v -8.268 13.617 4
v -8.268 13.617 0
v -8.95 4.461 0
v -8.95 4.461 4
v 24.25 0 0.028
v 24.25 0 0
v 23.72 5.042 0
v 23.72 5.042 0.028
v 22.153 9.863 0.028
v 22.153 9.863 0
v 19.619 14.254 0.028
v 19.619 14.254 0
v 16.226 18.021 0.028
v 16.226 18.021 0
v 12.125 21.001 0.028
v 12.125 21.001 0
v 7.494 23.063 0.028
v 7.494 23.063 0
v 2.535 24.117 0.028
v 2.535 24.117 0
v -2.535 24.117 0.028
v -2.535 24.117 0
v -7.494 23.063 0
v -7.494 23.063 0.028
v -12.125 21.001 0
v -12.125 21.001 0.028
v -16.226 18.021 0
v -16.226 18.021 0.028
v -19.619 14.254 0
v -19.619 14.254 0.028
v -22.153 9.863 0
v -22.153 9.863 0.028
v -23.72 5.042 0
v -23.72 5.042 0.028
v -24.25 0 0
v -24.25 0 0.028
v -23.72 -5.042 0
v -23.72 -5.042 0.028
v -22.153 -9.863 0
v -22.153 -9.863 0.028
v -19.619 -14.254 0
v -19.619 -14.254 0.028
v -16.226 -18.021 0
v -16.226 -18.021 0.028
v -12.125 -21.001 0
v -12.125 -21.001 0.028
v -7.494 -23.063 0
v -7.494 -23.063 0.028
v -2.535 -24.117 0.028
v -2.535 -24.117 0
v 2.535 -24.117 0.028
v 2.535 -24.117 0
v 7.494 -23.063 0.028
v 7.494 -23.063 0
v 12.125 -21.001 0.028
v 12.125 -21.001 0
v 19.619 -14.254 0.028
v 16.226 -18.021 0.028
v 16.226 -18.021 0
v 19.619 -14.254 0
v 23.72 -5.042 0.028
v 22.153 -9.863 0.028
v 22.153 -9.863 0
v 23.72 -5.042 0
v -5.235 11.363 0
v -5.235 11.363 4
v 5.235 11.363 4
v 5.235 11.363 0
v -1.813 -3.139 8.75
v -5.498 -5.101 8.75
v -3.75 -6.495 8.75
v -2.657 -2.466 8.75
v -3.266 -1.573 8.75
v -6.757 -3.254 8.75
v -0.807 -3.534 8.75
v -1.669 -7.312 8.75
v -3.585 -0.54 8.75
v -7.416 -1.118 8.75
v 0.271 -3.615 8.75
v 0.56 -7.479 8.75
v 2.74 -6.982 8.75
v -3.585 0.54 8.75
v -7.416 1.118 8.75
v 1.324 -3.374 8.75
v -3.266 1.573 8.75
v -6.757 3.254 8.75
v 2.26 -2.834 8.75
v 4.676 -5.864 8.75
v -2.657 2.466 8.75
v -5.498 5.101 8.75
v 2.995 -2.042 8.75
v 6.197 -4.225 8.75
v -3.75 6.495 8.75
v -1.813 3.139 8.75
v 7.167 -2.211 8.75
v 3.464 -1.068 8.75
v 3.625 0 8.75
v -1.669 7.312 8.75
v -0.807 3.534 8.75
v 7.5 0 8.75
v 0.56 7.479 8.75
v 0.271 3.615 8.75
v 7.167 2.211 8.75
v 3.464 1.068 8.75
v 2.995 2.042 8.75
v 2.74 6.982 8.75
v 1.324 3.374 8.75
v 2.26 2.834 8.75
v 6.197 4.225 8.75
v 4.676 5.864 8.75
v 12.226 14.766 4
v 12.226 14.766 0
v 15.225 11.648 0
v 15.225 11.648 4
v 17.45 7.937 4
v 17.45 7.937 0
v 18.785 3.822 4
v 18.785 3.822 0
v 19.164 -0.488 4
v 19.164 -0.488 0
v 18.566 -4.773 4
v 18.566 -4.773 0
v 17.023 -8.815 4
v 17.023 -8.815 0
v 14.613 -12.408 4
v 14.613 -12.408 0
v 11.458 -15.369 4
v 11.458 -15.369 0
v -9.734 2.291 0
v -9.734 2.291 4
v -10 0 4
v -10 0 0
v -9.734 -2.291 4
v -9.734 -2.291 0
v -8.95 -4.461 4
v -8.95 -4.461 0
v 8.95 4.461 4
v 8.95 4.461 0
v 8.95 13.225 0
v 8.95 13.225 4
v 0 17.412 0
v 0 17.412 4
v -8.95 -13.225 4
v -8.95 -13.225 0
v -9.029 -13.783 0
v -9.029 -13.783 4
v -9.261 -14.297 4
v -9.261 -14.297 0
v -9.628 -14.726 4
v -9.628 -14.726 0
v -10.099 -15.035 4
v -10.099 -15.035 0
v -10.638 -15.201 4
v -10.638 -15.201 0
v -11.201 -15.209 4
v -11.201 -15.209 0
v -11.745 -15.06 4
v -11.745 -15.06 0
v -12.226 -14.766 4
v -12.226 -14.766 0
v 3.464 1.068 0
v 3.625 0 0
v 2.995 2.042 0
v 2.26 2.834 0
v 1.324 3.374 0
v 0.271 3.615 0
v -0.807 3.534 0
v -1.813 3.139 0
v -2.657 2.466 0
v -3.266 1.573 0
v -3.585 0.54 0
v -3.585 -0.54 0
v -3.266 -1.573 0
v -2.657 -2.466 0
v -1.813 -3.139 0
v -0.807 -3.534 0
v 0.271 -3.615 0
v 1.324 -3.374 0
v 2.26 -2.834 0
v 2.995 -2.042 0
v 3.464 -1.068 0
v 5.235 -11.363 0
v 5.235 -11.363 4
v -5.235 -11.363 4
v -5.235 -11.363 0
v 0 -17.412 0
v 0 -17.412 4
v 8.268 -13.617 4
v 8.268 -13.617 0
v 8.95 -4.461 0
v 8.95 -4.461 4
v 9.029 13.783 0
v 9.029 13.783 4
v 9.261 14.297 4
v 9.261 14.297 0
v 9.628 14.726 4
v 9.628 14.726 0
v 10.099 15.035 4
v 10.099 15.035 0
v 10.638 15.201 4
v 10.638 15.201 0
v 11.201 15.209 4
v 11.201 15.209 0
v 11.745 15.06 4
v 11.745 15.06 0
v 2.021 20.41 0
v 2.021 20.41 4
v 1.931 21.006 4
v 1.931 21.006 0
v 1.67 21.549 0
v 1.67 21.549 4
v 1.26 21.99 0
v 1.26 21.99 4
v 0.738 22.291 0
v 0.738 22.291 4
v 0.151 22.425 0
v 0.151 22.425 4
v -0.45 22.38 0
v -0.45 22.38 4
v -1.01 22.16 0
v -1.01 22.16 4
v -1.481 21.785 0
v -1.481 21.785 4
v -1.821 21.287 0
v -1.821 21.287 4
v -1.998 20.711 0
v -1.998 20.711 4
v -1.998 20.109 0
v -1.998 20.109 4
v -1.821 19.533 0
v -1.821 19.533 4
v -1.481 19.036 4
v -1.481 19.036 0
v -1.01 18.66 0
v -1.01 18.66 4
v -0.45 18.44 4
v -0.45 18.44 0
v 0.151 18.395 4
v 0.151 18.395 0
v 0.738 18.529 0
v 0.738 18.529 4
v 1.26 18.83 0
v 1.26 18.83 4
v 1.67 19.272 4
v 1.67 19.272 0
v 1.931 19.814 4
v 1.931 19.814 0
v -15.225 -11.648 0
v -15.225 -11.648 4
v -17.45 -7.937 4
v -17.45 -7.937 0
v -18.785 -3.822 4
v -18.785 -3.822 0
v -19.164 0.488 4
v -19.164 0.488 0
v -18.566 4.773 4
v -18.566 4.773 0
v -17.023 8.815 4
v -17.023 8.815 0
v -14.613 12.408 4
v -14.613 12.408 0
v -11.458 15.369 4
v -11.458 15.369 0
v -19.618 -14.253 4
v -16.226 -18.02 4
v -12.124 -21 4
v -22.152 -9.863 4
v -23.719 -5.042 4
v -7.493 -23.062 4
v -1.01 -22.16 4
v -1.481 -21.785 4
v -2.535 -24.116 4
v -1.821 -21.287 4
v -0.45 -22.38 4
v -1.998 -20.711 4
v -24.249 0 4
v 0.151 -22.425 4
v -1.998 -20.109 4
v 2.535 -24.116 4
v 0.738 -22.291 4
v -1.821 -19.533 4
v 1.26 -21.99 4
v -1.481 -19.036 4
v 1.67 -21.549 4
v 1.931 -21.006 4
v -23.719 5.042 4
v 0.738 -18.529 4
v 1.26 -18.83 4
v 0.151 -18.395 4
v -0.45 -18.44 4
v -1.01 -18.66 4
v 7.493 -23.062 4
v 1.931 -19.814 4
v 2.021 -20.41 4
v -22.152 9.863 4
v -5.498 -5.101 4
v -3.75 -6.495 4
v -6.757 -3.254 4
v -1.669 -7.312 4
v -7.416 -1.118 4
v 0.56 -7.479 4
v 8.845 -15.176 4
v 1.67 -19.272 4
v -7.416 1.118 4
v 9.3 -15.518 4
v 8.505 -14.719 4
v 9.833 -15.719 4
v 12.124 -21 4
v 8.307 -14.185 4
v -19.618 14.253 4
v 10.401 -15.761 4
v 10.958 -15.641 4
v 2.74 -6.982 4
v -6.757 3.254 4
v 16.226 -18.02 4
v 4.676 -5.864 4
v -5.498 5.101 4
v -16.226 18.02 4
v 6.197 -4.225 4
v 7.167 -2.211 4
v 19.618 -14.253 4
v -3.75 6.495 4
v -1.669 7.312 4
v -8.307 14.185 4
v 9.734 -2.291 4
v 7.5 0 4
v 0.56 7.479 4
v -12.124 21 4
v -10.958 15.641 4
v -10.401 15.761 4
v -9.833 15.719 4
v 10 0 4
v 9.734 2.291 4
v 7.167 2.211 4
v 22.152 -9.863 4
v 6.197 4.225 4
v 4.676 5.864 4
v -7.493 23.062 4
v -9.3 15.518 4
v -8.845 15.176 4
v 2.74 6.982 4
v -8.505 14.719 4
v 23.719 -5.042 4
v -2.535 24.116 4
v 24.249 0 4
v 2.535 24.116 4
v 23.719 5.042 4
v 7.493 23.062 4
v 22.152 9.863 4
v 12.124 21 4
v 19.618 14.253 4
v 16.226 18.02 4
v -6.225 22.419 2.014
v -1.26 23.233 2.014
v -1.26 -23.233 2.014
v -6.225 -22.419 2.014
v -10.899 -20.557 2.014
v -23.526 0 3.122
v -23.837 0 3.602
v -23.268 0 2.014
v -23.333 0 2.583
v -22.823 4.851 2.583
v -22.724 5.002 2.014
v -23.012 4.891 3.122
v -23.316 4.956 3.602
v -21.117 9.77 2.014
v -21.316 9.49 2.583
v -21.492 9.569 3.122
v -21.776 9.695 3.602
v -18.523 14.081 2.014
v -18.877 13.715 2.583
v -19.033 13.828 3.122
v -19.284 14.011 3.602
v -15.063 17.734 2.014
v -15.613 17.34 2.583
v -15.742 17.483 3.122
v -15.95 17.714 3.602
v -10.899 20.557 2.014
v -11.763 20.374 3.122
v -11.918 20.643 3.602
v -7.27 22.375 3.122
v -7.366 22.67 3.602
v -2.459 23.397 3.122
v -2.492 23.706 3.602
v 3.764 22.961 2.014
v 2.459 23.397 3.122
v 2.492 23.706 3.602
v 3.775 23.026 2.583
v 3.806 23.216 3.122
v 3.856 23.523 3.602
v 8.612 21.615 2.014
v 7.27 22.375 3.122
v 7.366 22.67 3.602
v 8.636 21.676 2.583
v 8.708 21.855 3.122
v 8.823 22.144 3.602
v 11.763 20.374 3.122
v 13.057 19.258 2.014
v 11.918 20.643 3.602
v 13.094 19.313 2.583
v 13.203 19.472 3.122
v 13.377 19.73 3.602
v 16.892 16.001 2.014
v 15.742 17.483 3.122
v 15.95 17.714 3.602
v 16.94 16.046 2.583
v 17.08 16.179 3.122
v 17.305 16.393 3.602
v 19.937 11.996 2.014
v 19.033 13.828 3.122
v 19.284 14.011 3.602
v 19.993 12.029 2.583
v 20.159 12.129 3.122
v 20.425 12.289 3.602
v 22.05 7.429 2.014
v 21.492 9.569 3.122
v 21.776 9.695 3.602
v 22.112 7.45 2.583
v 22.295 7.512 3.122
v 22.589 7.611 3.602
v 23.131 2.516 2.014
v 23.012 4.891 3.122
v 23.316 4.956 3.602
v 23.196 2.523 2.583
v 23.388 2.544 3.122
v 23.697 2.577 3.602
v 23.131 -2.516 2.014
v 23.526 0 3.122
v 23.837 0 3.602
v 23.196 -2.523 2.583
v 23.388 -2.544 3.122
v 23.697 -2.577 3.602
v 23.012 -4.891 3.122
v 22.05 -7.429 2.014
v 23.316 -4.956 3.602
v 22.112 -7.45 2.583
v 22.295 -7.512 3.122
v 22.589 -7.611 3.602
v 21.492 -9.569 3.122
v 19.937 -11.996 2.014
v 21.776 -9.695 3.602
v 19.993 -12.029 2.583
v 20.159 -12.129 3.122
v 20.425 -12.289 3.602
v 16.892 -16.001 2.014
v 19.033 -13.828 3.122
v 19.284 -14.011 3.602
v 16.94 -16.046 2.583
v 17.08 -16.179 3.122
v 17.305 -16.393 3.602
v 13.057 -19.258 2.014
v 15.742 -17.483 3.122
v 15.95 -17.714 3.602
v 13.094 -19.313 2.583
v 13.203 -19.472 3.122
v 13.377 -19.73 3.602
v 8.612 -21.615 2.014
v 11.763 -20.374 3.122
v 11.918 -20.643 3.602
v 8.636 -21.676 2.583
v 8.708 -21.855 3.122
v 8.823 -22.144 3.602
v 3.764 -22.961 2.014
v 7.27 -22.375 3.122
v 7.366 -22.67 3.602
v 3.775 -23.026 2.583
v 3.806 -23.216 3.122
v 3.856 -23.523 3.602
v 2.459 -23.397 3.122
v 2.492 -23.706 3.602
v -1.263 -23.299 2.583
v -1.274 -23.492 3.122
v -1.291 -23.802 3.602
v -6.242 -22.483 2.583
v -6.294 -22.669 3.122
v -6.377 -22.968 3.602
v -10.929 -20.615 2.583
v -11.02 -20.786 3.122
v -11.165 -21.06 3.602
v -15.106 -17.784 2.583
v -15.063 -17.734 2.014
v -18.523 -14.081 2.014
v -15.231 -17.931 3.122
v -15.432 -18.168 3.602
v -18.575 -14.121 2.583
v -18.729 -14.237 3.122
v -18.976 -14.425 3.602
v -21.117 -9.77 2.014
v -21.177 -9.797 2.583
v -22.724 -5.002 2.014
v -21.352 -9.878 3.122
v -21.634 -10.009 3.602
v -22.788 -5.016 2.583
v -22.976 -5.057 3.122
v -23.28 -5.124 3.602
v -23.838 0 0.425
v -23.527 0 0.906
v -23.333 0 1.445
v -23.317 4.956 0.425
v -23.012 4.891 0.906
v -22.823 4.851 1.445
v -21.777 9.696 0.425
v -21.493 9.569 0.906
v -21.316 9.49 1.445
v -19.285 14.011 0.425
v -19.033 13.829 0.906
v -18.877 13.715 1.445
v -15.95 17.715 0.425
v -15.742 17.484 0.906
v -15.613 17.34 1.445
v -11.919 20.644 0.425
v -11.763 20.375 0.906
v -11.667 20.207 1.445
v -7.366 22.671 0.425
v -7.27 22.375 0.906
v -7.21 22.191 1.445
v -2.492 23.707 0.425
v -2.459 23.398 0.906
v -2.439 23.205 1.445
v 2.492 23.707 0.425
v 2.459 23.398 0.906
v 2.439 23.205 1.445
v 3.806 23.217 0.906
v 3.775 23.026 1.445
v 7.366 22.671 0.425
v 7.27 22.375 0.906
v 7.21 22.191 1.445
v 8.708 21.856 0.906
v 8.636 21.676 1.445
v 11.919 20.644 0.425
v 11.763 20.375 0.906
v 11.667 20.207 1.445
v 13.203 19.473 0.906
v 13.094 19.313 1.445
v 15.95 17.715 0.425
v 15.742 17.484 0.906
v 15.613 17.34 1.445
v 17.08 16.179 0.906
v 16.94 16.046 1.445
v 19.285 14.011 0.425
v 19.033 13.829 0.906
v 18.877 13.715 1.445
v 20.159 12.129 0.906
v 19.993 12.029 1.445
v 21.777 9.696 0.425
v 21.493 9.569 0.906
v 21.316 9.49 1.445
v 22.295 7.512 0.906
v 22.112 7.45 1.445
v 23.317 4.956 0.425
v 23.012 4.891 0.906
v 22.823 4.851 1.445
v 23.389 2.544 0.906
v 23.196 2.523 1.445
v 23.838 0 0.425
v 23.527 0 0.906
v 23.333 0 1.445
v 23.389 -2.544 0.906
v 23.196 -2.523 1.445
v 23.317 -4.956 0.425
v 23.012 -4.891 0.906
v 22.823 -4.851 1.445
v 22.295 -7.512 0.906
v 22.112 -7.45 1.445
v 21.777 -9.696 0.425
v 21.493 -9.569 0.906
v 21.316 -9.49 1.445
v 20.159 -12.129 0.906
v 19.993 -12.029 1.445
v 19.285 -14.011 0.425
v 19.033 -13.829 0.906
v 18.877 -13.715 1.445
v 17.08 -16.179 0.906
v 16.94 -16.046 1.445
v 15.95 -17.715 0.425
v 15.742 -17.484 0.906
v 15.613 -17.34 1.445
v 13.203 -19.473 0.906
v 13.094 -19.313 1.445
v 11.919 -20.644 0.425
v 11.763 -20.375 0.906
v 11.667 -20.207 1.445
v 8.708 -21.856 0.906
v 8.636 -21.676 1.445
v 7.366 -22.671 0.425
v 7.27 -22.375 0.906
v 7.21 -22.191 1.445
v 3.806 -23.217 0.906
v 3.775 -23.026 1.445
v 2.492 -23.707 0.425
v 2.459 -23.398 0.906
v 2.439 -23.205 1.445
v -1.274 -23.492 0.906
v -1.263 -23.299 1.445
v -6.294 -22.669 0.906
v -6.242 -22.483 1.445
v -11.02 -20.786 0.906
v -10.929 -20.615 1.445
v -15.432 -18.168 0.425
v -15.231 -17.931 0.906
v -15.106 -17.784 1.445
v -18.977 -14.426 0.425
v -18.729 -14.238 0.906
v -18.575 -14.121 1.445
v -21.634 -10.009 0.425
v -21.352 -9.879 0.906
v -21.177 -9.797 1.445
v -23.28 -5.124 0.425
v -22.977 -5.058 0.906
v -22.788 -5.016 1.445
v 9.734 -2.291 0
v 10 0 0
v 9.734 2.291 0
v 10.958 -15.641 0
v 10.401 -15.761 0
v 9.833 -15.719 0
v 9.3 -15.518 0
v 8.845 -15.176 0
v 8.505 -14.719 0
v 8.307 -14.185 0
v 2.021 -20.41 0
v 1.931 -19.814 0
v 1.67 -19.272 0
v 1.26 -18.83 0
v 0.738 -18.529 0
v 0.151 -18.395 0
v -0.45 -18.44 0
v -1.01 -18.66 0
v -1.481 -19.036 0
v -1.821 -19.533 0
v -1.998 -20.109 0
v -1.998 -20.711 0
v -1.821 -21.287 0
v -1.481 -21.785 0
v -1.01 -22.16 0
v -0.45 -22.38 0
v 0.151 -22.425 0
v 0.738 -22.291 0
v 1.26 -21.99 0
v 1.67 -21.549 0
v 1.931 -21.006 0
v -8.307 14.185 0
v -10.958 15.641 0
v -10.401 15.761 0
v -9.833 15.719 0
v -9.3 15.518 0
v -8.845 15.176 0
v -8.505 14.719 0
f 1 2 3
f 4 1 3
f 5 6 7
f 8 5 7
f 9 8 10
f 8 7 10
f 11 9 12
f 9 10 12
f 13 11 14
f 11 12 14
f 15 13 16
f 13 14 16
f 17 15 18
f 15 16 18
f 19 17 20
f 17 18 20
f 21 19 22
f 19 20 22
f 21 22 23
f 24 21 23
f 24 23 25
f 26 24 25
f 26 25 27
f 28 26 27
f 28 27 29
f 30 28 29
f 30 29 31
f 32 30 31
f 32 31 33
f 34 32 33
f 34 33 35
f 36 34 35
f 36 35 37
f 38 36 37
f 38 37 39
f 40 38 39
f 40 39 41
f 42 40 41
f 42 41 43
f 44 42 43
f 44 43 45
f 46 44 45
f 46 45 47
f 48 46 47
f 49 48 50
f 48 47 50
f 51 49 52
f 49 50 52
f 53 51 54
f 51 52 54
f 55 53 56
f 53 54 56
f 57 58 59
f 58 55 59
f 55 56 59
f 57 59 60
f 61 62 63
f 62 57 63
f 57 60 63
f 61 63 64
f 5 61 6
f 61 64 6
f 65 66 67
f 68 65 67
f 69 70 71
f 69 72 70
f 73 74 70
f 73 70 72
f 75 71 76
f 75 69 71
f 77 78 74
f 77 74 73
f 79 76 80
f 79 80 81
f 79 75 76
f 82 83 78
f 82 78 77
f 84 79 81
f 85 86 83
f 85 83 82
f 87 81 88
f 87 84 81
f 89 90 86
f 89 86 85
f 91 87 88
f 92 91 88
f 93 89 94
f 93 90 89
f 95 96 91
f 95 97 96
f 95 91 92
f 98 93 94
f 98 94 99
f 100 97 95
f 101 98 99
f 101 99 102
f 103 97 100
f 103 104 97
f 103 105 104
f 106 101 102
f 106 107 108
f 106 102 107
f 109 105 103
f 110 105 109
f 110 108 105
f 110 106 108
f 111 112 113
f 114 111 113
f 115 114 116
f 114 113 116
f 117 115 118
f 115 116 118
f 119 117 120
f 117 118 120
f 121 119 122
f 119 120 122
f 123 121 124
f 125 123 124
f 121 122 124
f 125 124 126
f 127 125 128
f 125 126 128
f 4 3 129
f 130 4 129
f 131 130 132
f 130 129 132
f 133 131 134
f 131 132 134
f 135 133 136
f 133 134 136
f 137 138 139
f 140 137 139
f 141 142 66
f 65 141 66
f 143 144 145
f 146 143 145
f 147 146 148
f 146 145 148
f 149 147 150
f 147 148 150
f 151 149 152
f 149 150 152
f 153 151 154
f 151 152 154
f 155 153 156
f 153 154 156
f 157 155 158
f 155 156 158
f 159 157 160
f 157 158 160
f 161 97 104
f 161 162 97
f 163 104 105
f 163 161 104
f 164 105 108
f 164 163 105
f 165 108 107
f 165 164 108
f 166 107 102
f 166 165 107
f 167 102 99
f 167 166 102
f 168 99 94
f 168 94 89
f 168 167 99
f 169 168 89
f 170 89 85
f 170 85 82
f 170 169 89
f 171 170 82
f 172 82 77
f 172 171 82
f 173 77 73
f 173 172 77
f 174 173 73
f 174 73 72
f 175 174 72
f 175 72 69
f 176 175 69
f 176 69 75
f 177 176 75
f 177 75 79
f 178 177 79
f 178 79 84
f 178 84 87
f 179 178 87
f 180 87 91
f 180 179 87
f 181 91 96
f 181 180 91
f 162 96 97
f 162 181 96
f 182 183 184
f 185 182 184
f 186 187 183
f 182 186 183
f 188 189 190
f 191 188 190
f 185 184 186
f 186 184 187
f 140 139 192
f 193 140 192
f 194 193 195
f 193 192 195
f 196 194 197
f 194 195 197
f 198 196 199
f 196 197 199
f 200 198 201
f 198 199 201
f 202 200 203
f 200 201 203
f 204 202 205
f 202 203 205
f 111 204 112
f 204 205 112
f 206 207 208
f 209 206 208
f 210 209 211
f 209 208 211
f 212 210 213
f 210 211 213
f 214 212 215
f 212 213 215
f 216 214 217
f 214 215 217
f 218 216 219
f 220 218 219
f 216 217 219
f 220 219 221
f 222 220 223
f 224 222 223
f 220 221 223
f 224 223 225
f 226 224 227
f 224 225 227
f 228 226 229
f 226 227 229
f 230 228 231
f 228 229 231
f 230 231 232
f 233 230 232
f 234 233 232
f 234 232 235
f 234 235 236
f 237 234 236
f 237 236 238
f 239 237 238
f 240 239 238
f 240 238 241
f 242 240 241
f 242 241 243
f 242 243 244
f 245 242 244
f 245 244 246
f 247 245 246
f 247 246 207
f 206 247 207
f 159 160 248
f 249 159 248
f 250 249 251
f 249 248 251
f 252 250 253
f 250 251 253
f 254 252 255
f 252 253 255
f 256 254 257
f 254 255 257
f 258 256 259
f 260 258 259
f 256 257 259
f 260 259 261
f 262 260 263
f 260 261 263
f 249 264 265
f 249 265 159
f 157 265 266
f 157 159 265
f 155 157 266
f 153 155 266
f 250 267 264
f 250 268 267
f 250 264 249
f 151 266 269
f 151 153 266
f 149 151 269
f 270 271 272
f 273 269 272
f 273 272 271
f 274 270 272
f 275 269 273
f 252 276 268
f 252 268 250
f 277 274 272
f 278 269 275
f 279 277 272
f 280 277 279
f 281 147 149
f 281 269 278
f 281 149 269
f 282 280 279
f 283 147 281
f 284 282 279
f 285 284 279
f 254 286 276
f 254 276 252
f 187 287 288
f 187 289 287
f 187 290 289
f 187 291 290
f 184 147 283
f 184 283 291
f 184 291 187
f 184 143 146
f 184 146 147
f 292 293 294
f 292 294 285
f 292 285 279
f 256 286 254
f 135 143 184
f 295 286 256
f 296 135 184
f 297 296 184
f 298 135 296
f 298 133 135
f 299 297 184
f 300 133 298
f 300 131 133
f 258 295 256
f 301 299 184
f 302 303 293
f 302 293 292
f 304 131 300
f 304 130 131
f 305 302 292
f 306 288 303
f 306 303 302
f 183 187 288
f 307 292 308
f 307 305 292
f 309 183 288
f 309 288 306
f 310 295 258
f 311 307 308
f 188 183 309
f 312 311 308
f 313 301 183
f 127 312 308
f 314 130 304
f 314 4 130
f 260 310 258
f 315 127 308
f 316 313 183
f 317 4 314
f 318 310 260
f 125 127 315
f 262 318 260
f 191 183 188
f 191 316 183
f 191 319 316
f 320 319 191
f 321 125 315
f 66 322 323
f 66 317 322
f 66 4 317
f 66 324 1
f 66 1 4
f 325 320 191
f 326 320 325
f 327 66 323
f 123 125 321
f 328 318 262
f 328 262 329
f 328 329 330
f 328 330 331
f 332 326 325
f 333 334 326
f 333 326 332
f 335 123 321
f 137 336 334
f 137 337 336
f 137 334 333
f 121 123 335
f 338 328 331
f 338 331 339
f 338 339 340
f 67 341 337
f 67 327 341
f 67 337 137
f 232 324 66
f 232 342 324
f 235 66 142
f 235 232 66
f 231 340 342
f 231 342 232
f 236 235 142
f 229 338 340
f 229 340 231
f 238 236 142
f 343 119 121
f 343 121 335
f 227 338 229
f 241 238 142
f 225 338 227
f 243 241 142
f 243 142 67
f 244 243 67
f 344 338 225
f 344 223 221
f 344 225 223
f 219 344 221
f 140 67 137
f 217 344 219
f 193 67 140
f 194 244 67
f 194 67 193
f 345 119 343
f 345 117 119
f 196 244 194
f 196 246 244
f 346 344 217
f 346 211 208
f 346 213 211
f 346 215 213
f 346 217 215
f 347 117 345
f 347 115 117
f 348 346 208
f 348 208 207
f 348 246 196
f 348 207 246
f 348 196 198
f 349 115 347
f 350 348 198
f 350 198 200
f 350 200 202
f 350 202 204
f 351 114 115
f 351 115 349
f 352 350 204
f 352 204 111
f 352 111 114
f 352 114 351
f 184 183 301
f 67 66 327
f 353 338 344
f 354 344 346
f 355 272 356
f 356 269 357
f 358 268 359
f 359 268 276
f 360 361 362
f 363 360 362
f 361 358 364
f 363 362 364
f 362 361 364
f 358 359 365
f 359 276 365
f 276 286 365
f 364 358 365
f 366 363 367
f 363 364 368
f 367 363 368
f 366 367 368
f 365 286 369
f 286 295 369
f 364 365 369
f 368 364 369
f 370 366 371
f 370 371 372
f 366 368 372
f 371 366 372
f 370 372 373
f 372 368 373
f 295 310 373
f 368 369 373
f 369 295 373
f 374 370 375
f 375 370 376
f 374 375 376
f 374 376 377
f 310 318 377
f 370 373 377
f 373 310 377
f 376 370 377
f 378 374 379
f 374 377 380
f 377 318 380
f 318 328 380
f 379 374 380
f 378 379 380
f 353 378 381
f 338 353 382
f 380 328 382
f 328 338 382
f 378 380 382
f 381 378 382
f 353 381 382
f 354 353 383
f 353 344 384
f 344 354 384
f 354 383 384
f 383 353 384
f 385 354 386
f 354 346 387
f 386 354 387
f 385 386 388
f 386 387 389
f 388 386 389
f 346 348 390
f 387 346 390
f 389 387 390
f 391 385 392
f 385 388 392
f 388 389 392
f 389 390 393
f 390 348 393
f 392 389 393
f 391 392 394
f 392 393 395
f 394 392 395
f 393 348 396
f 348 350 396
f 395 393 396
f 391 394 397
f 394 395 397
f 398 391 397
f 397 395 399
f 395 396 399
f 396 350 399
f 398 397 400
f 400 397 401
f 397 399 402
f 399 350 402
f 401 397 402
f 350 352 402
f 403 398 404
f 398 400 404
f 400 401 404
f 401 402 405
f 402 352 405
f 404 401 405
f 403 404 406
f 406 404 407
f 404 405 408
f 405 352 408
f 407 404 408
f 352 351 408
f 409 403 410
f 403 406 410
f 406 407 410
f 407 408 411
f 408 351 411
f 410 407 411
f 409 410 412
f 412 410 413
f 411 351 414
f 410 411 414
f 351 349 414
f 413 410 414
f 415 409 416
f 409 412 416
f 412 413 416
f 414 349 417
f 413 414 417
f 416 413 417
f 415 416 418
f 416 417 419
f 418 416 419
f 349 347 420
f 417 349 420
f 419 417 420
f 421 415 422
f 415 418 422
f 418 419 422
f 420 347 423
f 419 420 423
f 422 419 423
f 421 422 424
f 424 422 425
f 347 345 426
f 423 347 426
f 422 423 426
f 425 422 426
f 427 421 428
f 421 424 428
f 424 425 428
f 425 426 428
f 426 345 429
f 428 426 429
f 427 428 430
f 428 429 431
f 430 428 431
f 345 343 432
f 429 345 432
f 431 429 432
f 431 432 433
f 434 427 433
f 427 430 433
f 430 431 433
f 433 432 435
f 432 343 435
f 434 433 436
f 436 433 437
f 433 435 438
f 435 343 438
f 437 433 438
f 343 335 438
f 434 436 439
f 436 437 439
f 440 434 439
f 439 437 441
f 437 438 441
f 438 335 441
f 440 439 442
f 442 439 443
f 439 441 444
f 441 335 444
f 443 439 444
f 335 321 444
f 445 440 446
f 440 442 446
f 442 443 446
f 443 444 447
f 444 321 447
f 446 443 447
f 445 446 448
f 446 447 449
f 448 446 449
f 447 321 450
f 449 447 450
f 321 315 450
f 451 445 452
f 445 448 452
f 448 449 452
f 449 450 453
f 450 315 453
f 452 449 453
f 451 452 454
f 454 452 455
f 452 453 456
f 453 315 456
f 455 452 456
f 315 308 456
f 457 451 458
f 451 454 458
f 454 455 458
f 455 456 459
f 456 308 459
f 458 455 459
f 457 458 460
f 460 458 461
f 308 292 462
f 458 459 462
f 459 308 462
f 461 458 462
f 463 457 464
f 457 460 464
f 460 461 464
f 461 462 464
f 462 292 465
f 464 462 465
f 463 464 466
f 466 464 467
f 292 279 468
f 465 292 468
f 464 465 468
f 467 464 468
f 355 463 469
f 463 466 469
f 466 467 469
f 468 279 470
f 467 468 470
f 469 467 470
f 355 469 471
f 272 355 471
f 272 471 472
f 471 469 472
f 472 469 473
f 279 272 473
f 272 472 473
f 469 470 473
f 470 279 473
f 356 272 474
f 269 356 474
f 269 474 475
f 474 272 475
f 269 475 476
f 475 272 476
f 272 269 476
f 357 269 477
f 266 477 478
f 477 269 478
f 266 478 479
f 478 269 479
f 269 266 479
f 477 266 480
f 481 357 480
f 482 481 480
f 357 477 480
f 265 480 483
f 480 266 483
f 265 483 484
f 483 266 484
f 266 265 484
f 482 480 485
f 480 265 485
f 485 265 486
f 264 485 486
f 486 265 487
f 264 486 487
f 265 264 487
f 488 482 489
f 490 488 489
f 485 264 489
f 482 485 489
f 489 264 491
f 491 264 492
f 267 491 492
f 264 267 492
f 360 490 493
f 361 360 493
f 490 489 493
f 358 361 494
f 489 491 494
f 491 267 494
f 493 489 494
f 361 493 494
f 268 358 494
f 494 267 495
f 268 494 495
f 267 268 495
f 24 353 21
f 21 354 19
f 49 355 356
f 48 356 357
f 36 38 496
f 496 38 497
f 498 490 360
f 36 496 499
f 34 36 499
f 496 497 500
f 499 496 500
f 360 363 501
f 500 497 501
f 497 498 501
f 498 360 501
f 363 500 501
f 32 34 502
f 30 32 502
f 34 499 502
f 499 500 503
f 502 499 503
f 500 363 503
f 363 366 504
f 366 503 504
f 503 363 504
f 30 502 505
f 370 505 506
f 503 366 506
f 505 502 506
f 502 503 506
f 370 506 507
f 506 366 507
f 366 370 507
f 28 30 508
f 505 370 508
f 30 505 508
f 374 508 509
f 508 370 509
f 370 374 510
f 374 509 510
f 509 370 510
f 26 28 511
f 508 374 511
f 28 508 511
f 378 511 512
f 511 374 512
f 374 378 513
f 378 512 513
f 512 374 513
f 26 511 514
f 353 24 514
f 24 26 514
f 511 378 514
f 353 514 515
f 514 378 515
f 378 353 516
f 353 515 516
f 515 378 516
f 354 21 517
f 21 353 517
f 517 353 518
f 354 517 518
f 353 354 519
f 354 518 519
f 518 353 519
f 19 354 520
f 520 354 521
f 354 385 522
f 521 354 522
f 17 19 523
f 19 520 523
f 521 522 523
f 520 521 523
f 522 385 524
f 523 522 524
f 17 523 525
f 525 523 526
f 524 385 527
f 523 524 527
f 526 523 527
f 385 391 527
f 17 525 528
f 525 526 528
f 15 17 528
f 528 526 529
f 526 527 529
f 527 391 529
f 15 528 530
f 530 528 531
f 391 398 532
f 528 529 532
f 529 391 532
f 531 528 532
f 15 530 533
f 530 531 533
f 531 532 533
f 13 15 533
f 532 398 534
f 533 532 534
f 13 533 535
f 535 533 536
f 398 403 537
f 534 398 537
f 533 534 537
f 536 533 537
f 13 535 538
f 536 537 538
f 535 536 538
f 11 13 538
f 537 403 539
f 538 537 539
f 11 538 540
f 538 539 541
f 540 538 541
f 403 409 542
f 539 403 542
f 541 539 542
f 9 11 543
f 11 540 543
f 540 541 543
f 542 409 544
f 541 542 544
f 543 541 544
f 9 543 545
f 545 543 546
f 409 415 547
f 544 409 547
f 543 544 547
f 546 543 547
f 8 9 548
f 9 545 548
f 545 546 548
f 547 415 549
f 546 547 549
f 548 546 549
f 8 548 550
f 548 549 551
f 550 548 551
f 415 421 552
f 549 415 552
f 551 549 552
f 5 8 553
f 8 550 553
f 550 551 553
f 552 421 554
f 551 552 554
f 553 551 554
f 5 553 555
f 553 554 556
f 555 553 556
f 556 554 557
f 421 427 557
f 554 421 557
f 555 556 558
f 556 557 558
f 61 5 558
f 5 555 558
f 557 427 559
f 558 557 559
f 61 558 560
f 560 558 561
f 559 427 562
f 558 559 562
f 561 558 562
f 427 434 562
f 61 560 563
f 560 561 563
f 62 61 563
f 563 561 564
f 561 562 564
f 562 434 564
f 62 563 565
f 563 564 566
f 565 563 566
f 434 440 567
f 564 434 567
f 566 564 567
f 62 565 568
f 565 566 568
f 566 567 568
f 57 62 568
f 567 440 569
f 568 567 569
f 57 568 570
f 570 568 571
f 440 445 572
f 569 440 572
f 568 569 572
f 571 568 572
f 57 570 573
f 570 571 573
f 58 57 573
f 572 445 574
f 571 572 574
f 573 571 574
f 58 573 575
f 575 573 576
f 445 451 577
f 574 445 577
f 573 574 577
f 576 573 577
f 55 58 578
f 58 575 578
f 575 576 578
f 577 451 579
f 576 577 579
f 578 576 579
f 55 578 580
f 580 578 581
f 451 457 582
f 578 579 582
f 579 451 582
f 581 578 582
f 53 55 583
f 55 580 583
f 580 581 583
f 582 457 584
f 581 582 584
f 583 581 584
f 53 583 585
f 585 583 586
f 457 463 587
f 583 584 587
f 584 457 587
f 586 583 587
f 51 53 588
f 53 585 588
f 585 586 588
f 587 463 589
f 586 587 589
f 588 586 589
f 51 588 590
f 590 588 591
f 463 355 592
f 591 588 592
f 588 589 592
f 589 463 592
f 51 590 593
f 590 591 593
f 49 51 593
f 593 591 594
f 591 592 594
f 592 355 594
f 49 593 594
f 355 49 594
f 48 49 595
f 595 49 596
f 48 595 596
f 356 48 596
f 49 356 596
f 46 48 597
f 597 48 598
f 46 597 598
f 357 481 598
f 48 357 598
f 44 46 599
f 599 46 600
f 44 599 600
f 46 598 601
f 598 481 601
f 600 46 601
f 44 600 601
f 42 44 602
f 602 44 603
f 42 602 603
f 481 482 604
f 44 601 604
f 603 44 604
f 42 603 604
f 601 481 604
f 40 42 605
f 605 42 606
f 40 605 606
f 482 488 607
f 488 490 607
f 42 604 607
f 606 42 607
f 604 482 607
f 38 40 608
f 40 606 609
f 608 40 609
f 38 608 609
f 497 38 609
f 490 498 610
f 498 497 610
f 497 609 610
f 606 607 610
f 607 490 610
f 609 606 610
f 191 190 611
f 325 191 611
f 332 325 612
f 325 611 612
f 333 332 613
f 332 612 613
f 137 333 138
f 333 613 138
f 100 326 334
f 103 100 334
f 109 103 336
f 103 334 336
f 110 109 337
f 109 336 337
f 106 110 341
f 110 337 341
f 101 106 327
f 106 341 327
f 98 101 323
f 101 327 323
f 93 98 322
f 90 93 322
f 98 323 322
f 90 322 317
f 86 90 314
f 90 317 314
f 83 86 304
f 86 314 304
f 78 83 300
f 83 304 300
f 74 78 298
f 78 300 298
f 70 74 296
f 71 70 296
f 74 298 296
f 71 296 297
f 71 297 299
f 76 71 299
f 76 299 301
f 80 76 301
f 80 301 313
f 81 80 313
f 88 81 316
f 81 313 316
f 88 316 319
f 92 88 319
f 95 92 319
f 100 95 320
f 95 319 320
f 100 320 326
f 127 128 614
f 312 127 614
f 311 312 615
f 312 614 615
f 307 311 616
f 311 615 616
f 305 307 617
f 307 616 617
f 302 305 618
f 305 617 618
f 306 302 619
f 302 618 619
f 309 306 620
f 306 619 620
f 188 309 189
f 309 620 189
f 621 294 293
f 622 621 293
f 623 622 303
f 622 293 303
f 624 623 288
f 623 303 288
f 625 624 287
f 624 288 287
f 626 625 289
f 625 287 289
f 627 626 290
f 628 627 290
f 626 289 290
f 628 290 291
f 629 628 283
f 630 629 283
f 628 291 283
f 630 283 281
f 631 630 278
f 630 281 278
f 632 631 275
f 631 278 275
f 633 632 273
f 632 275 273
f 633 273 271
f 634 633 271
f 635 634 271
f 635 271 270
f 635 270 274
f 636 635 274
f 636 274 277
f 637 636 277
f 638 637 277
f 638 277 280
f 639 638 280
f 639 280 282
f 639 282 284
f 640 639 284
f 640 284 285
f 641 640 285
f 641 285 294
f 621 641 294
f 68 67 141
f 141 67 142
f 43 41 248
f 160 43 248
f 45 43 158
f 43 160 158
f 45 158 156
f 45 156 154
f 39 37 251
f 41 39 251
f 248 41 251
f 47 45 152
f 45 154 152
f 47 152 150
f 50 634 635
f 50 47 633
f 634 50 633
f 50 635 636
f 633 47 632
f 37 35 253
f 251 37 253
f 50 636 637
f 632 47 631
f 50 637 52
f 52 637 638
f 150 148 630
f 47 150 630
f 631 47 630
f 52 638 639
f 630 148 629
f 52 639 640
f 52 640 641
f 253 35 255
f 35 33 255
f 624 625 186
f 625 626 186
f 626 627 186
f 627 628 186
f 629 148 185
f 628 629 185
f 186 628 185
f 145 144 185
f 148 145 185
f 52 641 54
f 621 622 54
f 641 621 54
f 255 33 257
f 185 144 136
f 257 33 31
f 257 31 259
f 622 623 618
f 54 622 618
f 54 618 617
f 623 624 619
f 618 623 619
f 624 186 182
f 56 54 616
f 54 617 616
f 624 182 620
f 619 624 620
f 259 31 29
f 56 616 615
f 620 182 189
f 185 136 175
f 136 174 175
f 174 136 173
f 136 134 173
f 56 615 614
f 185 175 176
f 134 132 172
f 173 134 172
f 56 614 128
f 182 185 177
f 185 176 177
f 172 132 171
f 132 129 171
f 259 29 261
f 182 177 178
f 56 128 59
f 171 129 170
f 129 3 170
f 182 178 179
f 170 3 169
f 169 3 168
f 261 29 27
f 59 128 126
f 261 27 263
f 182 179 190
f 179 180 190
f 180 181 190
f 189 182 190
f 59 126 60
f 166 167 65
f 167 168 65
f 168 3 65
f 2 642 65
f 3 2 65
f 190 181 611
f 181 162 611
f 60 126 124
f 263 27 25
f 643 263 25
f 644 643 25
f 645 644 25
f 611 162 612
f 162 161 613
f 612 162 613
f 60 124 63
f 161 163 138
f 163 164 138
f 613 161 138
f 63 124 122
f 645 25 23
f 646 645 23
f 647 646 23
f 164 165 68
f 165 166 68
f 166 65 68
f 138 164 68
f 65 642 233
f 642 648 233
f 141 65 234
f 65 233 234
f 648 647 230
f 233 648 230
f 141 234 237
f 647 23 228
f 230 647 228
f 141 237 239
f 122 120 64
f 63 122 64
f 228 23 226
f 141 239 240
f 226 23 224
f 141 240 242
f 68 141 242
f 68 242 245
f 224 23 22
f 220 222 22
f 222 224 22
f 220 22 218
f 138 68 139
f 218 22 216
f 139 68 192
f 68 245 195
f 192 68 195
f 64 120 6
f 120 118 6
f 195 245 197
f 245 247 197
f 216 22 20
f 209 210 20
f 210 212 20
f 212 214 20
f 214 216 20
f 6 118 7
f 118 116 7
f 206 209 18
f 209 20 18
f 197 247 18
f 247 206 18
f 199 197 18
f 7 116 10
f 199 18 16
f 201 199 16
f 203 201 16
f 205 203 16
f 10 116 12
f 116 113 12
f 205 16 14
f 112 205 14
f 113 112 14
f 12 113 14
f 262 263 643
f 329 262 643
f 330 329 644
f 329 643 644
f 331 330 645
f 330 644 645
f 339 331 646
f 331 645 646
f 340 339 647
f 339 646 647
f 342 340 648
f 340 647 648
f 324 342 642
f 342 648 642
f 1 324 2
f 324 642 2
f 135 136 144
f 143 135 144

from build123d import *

# Parameters (mm, degrees)
F0_R     = 24.25
F0_R_2   = 3.625
F1_DEPTH = 4
F2_R     = 7.5
F2_R_2   = 3.625
F3_DEPTH = 4.75
F4_R     = 2.020962
F5_DEPTH = 4.001
F6_R     = 2.5


with BuildPart() as f1:
    # F0 (on Top) → F1 (new body)
    with BuildSketch(Plane.XY):
        Circle(F0_R)
        with BuildLine():
            Line((8.950036, 4.46059), (8.950036, 13.225189))
            ThreePointArc((8.950036, 13.225189), (10.098851, 15.035019), (12.22552, 14.765688))
            ThreePointArc((12.22552, 14.765688), (19.163787, -0.488041), (11.458089, -15.368835))
            ThreePointArc((11.458089, -15.368835), (9.299885, -15.51842), (8.268192, -13.616887))
            Line((8.268192, -13.616887), (8.950036, -4.46059))
            ThreePointArc((8.950036, -4.46059), (10, 0), (8.950036, 4.46059))
        make_face(mode=Mode.SUBTRACT)
        with BuildLine():
            Line((-8.268192, 13.616887), (-8.950036, 4.46059))
            ThreePointArc((-8.950036, 4.46059), (-10, 0), (-8.950036, -4.46059))
            Line((-8.950036, -4.46059), (-8.950036, -13.225189))
            ThreePointArc((-8.950036, -13.225189), (-10.098851, -15.035019), (-12.22552, -14.765688))
            ThreePointArc((-12.22552, -14.765688), (-19.163787, 0.488041), (-11.458089, 15.368835))
            ThreePointArc((-11.458089, 15.368835), (-9.299885, 15.51842), (-8.268192, 13.616887))
        make_face(mode=Mode.SUBTRACT)
        Circle(F0_R_2, mode=Mode.SUBTRACT)
    extrude(amount=F1_DEPTH)

    # F2 (on face) → F3 (join)
    with BuildSketch(Plane.XY.offset(4)):
        Circle(F2_R)
        Circle(F2_R_2, mode=Mode.SUBTRACT)
    extrude(amount=F3_DEPTH)

    # F4 (on face) → F5 (cut, through all)
    with BuildSketch(Plane.XY.offset(4)):
        Polygon((-5.234685, 11.362989), (0, 11.362989), (0, 17.41166), align=None)
        Polygon((0, 17.41166), (0, 11.362989), (5.234685, 11.362989), align=None)
        Polygon((0, -11.362989), (-5.234685, -11.362989), (0, -17.41166), (5.234685, -11.362989), align=None)
        with Locations((0, 20.410169)):
            Circle(F4_R)
        with Locations((0, -20.410169)):
            Circle(F4_R)
    extrude(amount=-F5_DEPTH, mode=Mode.SUBTRACT)

    # F6 (on Front) → F7 (revolve, cut)
    with BuildSketch(Plane.XZ):
        with Locations((-25.767528, 2.014234)):
            Circle(F6_R)
    revolve(axis=Axis((0, 0, 7.021954), (0, 0, -1)), mode=Mode.SUBTRACT)


solid = f1.part
